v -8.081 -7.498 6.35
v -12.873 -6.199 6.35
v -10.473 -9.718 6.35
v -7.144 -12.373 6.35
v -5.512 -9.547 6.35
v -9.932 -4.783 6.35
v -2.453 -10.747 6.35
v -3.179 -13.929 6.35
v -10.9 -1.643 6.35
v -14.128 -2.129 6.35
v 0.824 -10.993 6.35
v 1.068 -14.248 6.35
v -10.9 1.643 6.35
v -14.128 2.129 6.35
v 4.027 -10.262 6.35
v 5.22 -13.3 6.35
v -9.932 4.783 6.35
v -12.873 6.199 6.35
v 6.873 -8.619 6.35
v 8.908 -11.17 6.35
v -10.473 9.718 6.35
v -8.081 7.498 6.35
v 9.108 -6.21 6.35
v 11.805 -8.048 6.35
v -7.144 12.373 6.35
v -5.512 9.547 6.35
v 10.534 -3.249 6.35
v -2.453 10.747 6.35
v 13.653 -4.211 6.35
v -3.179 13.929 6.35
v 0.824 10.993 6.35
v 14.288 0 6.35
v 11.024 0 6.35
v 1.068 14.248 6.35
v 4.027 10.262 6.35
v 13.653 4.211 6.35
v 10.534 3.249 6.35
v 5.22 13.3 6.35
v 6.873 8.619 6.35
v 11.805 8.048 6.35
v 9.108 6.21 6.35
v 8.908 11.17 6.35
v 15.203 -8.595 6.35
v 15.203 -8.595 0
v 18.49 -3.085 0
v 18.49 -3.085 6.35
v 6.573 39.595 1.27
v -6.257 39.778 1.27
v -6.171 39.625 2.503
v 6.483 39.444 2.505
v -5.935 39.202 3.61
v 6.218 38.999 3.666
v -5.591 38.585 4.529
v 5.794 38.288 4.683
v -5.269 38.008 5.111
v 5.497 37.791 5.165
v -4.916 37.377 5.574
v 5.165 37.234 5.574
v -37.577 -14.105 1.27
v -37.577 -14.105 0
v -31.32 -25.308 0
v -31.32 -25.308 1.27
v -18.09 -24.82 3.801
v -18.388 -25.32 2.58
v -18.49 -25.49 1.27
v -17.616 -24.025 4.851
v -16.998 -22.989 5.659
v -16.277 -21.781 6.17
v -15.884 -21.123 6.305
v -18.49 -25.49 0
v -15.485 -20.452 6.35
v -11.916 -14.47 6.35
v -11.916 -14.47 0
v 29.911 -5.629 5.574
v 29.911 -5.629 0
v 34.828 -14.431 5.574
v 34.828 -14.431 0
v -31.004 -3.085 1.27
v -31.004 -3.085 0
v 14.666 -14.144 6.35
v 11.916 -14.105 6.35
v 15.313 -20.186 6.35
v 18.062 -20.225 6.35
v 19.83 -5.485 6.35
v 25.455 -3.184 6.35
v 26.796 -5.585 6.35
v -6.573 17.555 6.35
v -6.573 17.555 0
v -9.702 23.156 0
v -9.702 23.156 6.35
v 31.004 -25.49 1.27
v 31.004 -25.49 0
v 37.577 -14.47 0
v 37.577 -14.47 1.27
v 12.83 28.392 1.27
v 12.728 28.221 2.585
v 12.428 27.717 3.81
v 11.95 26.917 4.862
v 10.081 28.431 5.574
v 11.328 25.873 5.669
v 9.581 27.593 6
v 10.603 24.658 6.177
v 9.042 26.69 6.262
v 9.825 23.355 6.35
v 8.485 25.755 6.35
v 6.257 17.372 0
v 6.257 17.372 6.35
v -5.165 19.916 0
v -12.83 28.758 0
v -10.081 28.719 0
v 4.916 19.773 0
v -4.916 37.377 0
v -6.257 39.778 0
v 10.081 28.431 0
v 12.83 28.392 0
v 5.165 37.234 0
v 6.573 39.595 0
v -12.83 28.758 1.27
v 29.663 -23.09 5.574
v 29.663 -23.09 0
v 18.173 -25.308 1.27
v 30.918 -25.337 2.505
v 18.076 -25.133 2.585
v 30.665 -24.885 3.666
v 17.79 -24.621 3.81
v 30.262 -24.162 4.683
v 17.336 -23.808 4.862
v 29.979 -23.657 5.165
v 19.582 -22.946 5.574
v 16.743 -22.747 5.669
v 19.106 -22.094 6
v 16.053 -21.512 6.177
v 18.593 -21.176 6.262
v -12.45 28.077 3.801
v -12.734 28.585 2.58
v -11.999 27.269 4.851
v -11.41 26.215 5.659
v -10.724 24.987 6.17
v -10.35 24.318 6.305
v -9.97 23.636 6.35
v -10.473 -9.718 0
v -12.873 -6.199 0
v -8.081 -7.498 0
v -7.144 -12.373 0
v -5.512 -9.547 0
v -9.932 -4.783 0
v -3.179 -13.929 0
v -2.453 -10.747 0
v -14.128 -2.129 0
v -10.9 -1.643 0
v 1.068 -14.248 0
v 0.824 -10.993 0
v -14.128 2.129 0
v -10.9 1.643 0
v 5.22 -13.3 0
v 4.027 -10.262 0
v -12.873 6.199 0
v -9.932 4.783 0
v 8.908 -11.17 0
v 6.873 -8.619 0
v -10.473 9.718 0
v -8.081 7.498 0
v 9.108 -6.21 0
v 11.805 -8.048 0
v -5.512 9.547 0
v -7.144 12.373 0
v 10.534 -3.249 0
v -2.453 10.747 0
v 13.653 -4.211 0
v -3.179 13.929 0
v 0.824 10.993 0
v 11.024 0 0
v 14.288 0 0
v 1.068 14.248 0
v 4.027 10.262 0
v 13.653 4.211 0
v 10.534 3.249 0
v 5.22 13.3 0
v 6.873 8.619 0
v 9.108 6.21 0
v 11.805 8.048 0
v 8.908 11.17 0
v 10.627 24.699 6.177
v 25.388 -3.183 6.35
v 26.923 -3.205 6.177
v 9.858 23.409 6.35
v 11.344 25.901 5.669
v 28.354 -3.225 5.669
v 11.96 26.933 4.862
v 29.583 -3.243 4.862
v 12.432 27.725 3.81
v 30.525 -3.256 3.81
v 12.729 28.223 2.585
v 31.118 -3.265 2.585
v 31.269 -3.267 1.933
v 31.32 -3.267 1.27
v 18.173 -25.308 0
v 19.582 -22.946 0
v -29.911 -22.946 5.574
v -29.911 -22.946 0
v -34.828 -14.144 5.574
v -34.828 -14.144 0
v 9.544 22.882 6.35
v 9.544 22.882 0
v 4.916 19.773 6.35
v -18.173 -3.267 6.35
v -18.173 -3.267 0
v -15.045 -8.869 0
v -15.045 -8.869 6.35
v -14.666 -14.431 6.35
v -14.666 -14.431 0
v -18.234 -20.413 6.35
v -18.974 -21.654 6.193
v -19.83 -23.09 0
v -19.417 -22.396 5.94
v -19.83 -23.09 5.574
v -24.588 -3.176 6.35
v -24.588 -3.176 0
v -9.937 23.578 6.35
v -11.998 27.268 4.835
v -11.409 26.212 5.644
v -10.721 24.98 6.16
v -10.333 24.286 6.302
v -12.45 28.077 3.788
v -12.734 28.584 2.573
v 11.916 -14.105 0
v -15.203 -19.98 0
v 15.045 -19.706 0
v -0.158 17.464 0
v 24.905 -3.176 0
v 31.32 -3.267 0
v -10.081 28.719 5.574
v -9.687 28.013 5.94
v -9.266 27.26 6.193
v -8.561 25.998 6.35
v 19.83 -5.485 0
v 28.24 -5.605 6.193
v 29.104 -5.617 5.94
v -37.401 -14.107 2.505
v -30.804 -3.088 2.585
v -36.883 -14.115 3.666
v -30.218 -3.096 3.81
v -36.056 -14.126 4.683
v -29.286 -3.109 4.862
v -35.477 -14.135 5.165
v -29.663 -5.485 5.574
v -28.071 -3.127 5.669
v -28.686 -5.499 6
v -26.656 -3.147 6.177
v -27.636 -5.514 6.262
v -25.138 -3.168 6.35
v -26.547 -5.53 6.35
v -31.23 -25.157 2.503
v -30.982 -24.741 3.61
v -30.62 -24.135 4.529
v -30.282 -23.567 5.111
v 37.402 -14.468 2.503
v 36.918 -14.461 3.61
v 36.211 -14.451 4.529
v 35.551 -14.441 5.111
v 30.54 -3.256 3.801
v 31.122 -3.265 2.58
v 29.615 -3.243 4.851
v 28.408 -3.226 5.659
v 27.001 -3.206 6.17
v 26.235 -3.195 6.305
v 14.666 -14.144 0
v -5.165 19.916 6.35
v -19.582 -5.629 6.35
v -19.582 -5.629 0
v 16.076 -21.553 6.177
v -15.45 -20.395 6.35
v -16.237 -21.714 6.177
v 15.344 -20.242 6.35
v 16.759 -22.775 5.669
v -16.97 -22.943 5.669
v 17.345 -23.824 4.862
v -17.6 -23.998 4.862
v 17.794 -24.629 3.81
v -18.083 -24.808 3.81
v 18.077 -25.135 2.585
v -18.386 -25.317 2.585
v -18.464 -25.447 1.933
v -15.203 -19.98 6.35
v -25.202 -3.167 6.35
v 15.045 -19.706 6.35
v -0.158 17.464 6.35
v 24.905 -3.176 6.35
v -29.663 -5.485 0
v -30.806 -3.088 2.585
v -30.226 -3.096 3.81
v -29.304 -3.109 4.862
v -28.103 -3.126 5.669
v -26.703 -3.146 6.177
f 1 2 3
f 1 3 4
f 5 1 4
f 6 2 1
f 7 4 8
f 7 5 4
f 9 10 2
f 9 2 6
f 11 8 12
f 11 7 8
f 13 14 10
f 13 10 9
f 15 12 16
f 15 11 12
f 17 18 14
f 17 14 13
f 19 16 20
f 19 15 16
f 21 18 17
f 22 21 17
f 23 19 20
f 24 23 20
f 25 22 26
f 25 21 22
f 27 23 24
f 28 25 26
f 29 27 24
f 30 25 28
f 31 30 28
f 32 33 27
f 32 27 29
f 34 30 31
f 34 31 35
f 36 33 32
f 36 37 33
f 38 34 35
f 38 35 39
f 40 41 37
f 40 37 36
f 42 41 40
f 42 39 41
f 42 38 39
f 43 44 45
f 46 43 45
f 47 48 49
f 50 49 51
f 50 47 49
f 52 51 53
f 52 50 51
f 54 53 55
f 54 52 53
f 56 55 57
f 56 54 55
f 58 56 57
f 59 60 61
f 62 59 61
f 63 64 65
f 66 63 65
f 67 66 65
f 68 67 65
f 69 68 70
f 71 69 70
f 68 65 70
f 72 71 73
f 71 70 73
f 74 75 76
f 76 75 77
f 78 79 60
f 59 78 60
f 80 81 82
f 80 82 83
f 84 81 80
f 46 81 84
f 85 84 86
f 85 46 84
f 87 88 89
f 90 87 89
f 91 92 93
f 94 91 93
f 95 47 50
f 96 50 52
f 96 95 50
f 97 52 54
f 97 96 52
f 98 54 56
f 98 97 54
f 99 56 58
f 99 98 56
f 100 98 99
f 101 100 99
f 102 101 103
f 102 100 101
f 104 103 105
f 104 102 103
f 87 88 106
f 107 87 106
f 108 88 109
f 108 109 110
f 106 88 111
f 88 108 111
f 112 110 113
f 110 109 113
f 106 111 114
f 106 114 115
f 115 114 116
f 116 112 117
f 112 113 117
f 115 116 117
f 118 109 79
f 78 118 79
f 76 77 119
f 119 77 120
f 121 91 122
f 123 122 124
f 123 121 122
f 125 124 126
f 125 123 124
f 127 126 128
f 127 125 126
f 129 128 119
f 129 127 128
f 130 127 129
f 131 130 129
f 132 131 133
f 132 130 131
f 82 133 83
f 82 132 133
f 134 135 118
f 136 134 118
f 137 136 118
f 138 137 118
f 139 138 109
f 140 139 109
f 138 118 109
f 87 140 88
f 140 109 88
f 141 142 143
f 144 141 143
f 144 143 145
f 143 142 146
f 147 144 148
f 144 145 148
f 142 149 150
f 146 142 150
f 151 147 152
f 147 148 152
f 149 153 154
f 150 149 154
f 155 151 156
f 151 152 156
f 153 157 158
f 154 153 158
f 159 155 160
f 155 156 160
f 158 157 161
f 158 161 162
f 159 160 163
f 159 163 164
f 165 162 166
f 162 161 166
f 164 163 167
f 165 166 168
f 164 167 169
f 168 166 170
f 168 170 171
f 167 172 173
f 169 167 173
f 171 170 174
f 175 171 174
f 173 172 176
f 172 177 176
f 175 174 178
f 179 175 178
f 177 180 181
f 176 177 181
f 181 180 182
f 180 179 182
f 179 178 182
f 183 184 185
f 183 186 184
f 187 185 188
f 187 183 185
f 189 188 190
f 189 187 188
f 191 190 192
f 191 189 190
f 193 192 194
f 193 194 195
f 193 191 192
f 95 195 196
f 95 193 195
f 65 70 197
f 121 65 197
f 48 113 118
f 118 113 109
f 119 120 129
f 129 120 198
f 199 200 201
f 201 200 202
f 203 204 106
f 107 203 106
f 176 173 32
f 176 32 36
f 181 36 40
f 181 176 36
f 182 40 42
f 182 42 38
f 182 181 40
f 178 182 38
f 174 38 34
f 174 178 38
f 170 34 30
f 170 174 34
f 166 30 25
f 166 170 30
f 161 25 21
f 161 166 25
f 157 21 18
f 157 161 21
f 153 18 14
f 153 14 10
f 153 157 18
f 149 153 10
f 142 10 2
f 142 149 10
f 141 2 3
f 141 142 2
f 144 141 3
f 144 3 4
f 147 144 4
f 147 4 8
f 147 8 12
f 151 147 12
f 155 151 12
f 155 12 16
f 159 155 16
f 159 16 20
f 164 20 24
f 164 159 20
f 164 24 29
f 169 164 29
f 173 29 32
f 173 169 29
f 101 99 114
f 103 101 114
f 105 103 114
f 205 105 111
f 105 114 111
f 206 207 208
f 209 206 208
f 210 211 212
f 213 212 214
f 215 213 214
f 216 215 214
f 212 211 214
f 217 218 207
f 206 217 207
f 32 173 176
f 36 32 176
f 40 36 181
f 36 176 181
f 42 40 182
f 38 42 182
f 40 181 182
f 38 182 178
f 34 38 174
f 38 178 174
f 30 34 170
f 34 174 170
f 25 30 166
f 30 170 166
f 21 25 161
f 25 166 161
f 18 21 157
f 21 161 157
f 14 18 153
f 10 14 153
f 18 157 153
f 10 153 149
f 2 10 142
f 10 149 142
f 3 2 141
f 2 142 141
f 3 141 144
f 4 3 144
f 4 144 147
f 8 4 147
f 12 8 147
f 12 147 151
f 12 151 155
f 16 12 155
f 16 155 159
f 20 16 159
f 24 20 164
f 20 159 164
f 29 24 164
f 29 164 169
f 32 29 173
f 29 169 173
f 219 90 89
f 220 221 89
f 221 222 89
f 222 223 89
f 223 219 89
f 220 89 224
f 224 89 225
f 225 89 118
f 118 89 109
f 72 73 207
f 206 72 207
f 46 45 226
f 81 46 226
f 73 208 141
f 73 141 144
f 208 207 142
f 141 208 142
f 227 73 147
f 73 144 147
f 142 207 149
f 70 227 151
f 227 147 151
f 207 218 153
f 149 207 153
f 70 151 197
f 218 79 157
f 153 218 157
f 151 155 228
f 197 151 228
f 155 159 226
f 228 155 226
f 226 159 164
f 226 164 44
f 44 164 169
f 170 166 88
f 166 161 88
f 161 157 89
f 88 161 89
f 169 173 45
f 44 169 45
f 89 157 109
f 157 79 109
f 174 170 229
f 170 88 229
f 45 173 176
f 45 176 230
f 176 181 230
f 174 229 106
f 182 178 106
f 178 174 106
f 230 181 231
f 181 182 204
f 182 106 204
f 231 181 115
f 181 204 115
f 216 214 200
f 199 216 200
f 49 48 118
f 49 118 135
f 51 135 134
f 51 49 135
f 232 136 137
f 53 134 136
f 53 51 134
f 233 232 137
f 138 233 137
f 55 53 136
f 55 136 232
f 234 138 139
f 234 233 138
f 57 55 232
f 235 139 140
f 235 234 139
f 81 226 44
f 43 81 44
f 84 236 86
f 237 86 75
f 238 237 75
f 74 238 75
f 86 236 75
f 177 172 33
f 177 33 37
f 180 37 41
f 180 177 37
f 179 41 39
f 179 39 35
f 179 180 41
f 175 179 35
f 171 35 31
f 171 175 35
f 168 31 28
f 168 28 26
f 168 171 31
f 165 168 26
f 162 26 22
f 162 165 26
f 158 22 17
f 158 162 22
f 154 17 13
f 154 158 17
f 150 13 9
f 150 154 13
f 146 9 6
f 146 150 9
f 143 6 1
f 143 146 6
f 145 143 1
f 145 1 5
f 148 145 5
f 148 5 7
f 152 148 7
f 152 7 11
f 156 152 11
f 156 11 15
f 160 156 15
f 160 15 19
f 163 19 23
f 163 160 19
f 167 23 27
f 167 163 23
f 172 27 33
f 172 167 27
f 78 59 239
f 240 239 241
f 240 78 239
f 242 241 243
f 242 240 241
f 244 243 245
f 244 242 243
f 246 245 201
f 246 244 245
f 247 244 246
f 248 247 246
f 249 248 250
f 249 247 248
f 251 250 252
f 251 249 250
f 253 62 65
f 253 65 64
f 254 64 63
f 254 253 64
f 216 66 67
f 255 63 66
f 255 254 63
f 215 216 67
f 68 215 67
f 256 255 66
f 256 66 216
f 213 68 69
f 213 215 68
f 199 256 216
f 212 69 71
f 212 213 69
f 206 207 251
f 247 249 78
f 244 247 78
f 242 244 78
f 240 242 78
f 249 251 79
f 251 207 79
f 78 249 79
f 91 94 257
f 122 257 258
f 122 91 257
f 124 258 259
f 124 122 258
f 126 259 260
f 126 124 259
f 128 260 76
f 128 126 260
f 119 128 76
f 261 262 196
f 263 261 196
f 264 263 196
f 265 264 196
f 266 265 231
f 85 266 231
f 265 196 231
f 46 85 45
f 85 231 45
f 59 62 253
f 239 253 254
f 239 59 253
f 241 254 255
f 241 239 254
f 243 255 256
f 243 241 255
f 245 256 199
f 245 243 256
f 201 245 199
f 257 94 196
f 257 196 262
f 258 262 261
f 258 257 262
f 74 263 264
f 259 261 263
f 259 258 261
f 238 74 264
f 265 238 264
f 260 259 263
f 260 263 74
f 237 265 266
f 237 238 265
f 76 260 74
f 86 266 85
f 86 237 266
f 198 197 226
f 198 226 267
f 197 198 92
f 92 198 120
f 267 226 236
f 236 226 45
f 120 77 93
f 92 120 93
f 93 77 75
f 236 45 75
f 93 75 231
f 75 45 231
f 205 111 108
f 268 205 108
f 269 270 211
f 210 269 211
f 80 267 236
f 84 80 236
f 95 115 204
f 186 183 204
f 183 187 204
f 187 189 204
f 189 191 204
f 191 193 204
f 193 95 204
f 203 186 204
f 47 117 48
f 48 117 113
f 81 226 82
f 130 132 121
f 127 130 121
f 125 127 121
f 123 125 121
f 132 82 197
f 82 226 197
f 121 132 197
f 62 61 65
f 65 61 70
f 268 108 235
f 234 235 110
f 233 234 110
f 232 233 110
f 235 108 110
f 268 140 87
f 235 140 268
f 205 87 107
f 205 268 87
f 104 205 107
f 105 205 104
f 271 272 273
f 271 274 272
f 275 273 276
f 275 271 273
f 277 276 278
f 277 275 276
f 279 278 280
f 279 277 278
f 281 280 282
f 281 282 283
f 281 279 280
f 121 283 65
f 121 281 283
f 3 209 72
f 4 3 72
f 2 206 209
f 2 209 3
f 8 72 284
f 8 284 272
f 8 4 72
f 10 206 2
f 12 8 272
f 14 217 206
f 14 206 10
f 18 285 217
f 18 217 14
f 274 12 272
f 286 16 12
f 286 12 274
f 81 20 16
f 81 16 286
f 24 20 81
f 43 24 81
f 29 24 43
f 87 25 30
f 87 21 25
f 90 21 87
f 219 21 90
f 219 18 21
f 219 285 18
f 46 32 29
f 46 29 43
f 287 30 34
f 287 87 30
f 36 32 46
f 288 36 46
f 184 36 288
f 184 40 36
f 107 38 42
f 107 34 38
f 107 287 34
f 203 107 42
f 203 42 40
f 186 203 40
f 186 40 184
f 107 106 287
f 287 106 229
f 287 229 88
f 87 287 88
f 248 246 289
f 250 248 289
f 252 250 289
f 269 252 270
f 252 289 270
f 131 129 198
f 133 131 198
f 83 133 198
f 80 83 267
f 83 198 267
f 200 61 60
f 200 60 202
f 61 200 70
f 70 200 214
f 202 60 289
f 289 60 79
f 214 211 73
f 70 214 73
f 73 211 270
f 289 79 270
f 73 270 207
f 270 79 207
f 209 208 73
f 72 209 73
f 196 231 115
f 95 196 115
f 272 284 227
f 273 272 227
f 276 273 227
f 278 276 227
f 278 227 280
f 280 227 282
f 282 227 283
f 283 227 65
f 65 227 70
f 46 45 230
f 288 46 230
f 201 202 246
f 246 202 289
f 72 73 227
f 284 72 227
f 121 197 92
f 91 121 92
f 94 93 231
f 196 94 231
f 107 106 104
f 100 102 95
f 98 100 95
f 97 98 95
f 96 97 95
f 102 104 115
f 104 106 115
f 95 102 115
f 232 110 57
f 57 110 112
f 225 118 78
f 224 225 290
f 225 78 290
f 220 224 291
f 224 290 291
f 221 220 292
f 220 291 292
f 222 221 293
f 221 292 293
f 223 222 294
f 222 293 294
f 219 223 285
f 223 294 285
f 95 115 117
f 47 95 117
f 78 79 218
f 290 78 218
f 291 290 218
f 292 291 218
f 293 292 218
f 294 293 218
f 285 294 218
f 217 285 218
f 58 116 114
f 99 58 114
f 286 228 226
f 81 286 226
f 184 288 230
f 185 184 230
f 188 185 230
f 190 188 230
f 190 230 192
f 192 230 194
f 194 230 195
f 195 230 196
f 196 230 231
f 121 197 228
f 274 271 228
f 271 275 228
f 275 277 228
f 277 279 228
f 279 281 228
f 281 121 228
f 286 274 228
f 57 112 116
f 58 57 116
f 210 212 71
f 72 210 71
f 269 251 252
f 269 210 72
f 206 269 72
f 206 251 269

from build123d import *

# Parameters (mm, degrees)
F1_R          = 14.2875
F2_DEPTH      = 6.35
F0_R          = 14.2875
F0_R_2        = 11.0236
F3_T1_DEPTH   = 38.2316097327
F3_T3_DEPTH   = 38.2316097327
F3_T5_DEPTH   = 38.2316097327
F3_2_F1_R     = 5.08
F3_2_F2_R     = 5.08
F3_2_F3_R     = 5.08
F3_3_T1_DEPTH = 38.2316097327
F3_3_T3_DEPTH = 38.2316097327
F3_3_T5_DEPTH = 38.2316097327
F3_4_T1_DEPTH = 38.2316097327
F3_4_T3_DEPTH = 38.2316097327
F3_4_T5_DEPTH = 38.2316097327


# Not quite as in the source:
# - a fillet or chamfer that OpenCascade refuses, or shapes differently, is made with other operations: its cross-section is extruded or revolved along the edge and cut away or added


with BuildPart() as f2:
    # F1 (on Top) → F2 (new body)
    with BuildSketch(Plane.XY):
        Polygon((12.8303093344, 28.3923234629), (9.543630774, 22.8823057434), (6.2569521454, 17.3722879094), (-0.1582021818, 17.4636261732), (-6.573357189, 17.5549644466), (-9.7018333012, 23.1563205626), (-12.8303093344, 28.7576765371), (-31.0036280585, -3.0847879094), (-24.5884733182, -3.176126179), (-18.1733187241, -3.2674644466), (-15.0448426119, -8.8688205626), (-11.9163665788, -14.4701765371), (-15.2030451391, -19.9801942566), (-18.4897237678, -25.4902120906), (18.1733187241, -25.3075355534), (15.0448429163, -19.7061799824), (11.9163665788, -14.1048234629), (15.2030453836, -8.5948053335), (18.4897237678, -3.0847879094), (24.9048784863, -3.1761261787), (31.3200331022, -3.2674644466), align=None)
        Circle(F1_R, mode=Mode.SUBTRACT)
    extrude(amount=F2_DEPTH)

    # F3#2: fillet of radius 5.08 on 3 edges, made by hand

    # F3_2_f1
    f3_2_f1_edges = [f2.edges().sort_by_distance(p)[0] for p in [
        (-21.9169686964, 12.8364443138, 6.35),
    ]]
    fillet(f3_2_f1_edges, radius=F3_2_F1_R)

    # F3_2_f2
    f3_2_f2_edges = [f2.edges().sort_by_distance(p)[0] for p in [
        (22.0751712183, 12.5624295081, 6.35),
    ]]
    fillet(f3_2_f2_edges, radius=F3_2_F2_R)

    # F3_2_f3
    f3_2_f3_edges = [f2.edges().sort_by_distance(p)[0] for p in [
        (-0.1582025218, -25.398873822, 6.35),
    ]]
    fillet(f3_2_f3_edges, radius=F3_2_F3_R)


with BuildPart() as f2b:
    # F0 (on Top) → F2, piece 2 (new body)
    with BuildSketch(Plane.XY):
        Polygon((6.2569521454, 17.3722879094), (12.8303093344, 28.3923234629), (6.573357189, 39.5950355534), (-6.2569521454, 39.7777120906), (-12.8303093344, 28.7576765371), (-6.573357189, 17.5549644466), align=None)
        Polygon((5.1647806485, 37.2335993634), (10.0809573342, 28.4314684351), (4.9161766856, 19.7728690717), (-5.1647806485, 19.9164006366), (-10.0809573342, 28.7185315649), (-4.9161766856, 37.3771309283), align=None, mode=Mode.SUBTRACT)
    extrude(amount=F2_DEPTH)

    # F3: fillet of radius 5.08 on 3 edges, made by hand

    # F3_s2 → F3_t1 (cut)
    with BuildSketch(Plane(origin=(22.3643199705, 37.4931095506, 0), x_dir=(0, 0, 1), z_dir=(-0.5122784534, -0.8588194142, 0))):
        with BuildLine():
            ThreePointArc((1.27, 25.750856807), (4.8621024484, 24.2629592555), (6.35, 20.670856807))
            Line((6.35, 20.670856807), (6.35, 25.750856807))
            Line((6.35, 25.750856807), (1.27, 25.750856807))
        make_face()
    extrude(amount=F3_T1_DEPTH, mode=Mode.SUBTRACT)

    # F3_s4 → F3_t3 (cut)
    with BuildSketch(Plane(origin=(-2.8436871063, 5.0914578197, 0), x_dir=(0, 0, 1), z_dir=(-0.4876202032, 0.8730558616, 0))):
        with BuildLine():
            ThreePointArc((1.27, 25.0462473067), (4.8621024484, 23.5583497551), (6.35, 19.9662473067))
            Line((6.35, 19.9662473067), (6.35, 25.0462473067))
            Line((6.35, 25.0462473067), (1.27, 25.0462473067))
        make_face()
    extrude(amount=F3_T3_DEPTH, mode=Mode.SUBTRACT)

    # F3_s6 → F3_t5 (cut)
    with BuildSketch(Plane(origin=(18.707102349, -0.2663496715, 0), x_dir=(0, 0, 1), z_dir=(-0.9998986566, 0.0142364474, 0))):
        with BuildLine():
            ThreePointArc((1.27, 39.6846041137), (4.8621024484, 38.1967065621), (6.35, 34.6046041137))
            Line((6.35, 34.6046041137), (6.35, 39.6846041137))
            Line((6.35, 39.6846041137), (1.27, 39.6846041137))
        make_face()
    extrude(amount=F3_T5_DEPTH, mode=Mode.SUBTRACT)


with BuildPart() as f2c:
    # F0 (on Top) → F2, piece 3 (new body)
    with BuildSketch(Plane.XY):
        Circle(F0_R)
        Circle(F0_R_2, mode=Mode.SUBTRACT)
    extrude(amount=F2_DEPTH)


with BuildPart() as f2d:
    # F0 (on Top) → F2, piece 4 (new body)
    with BuildSketch(Plane.XY):
        Polygon((18.4897237678, -3.0847879094), (11.9163665788, -14.1048234629), (18.1733187241, -25.3075355534), (31.0036280585, -25.4902120906), (37.5769852475, -14.4701765371), (31.3200331022, -3.2674644466), align=None)
        Polygon((19.5818952646, -22.9460993634), (14.665718579, -14.1439684351), (19.8304992275, -5.4853690717), (29.9114565617, -5.6289006366), (34.8276332473, -14.4310315649), (29.6628525988, -23.0896309283), align=None, mode=Mode.SUBTRACT)
    extrude(amount=F2_DEPTH)

    # F3#4: fillet of radius 5.08 on 3 edges, made by hand

    # F3_4_s2 → F3_4_t1 (cut)
    with BuildSketch(Plane(origin=(5.8311753673, -0.0830236353, 0), x_dir=(0, 0, 1), z_dir=(0.9998986566, -0.0142364474, 0))):
        with BuildLine():
            ThreePointArc((1.27, 25.0462473067), (4.8621024484, 23.5583497551), (6.35, 19.9662473067))
            Line((6.35, 19.9662473067), (6.35, 25.0462473067))
            Line((6.35, 25.0462473067), (1.27, 25.0462473067))
        make_face()
    extrude(amount=F3_4_T1_DEPTH, mode=Mode.SUBTRACT)

    # F3_4_s4 → F3_4_t3 (cut)
    with BuildSketch(Plane(origin=(-9.5842167564, -16.0676510297, 0), x_dir=(0, 0, 1), z_dir=(0.5122784534, 0.8588194142, 0))):
        with BuildLine():
            ThreePointArc((1.27, 39.6846041137), (4.8621024484, 38.1967065621), (6.35, 34.6046041137))
            Line((6.35, 34.6046041137), (6.35, 39.6846041137))
            Line((6.35, 39.6846041137), (1.27, 39.6846041137))
        make_face()
    extrude(amount=F3_4_T3_DEPTH, mode=Mode.SUBTRACT)

    # F3_4_s6 → F3_4_t5 (cut)
    with BuildSketch(Plane(origin=(21.2878253524, -38.1146240081, 0), x_dir=(0, 0, 1), z_dir=(-0.4876202032, 0.8730558616, 0))):
        with BuildLine():
            ThreePointArc((1.27, 25.750856807), (4.8621024484, 24.2629592555), (6.35, 20.670856807))
            Line((6.35, 20.670856807), (6.35, 25.750856807))
            Line((6.35, 25.750856807), (1.27, 25.750856807))
        make_face()
    extrude(amount=F3_4_T5_DEPTH, mode=Mode.SUBTRACT)


with BuildPart() as f2e:
    # F0 (on Top) → F2, piece 5 (new body)
    with BuildSketch(Plane.XY):
        Polygon((-11.9163665788, -14.4701765371), (-18.1733187241, -3.2674644466), (-31.0036280585, -3.0847879094), (-37.5769852475, -14.1048234629), (-31.3200331022, -25.3075355534), (-18.4897237678, -25.4902120906), align=None)
        Polygon((-29.6628525988, -5.4853690717), (-19.5818952646, -5.6289006366), (-14.665718579, -14.4310315649), (-19.8304992275, -23.0896309283), (-29.9114565617, -22.9460993634), (-34.8276332473, -14.1439684351), align=None, mode=Mode.SUBTRACT)
    extrude(amount=F2_DEPTH)

    # F3#3: fillet of radius 5.08 on 3 edges, made by hand

    # F3_3_s2 → F3_3_t1 (cut)
    with BuildSketch(Plane(origin=(-2.987488261, -5.0084341843, 0), x_dir=(0, 0, 1), z_dir=(-0.5122784534, -0.8588194142, 0))):
        with BuildLine():
            ThreePointArc((1.27, 25.0462473067), (4.8621024484, 23.5583497551), (6.35, 19.9662473067))
            Line((6.35, 19.9662473067), (6.35, 25.0462473067))
            Line((6.35, 25.0462473067), (1.27, 25.0462473067))
        make_face()
    extrude(amount=F3_3_T1_DEPTH, mode=Mode.SUBTRACT)

    # F3_3_s4 → F3_3_t3 (cut)
    with BuildSketch(Plane(origin=(-9.1228855927, 16.3340007012, 0), x_dir=(0, 0, 1), z_dir=(0.4876202032, -0.8730558616, 0))):
        with BuildLine():
            ThreePointArc((1.27, 39.6846041137), (4.8621024484, 38.1967065621), (6.35, 34.6046041137))
            Line((6.35, 34.6046041137), (6.35, 39.6846041137))
            Line((6.35, 39.6846041137), (1.27, 39.6846041137))
        make_face()
    extrude(amount=F3_3_T3_DEPTH, mode=Mode.SUBTRACT)

    # F3_3_s6 → F3_3_t5 (cut)
    with BuildSketch(Plane(origin=(-43.6521453229, 0.6215144576, 0), x_dir=(0, 0, 1), z_dir=(0.9998986566, -0.0142364474, 0))):
        with BuildLine():
            ThreePointArc((1.27, 25.750856807), (4.8621024484, 24.2629592555), (6.35, 20.670856807))
            Line((6.35, 20.670856807), (6.35, 25.750856807))
            Line((6.35, 25.750856807), (1.27, 25.750856807))
        make_face()
    extrude(amount=F3_3_T5_DEPTH, mode=Mode.SUBTRACT)


solid = Compound([f2.part, f2b.part, f2c.part, f2d.part, f2e.part])
